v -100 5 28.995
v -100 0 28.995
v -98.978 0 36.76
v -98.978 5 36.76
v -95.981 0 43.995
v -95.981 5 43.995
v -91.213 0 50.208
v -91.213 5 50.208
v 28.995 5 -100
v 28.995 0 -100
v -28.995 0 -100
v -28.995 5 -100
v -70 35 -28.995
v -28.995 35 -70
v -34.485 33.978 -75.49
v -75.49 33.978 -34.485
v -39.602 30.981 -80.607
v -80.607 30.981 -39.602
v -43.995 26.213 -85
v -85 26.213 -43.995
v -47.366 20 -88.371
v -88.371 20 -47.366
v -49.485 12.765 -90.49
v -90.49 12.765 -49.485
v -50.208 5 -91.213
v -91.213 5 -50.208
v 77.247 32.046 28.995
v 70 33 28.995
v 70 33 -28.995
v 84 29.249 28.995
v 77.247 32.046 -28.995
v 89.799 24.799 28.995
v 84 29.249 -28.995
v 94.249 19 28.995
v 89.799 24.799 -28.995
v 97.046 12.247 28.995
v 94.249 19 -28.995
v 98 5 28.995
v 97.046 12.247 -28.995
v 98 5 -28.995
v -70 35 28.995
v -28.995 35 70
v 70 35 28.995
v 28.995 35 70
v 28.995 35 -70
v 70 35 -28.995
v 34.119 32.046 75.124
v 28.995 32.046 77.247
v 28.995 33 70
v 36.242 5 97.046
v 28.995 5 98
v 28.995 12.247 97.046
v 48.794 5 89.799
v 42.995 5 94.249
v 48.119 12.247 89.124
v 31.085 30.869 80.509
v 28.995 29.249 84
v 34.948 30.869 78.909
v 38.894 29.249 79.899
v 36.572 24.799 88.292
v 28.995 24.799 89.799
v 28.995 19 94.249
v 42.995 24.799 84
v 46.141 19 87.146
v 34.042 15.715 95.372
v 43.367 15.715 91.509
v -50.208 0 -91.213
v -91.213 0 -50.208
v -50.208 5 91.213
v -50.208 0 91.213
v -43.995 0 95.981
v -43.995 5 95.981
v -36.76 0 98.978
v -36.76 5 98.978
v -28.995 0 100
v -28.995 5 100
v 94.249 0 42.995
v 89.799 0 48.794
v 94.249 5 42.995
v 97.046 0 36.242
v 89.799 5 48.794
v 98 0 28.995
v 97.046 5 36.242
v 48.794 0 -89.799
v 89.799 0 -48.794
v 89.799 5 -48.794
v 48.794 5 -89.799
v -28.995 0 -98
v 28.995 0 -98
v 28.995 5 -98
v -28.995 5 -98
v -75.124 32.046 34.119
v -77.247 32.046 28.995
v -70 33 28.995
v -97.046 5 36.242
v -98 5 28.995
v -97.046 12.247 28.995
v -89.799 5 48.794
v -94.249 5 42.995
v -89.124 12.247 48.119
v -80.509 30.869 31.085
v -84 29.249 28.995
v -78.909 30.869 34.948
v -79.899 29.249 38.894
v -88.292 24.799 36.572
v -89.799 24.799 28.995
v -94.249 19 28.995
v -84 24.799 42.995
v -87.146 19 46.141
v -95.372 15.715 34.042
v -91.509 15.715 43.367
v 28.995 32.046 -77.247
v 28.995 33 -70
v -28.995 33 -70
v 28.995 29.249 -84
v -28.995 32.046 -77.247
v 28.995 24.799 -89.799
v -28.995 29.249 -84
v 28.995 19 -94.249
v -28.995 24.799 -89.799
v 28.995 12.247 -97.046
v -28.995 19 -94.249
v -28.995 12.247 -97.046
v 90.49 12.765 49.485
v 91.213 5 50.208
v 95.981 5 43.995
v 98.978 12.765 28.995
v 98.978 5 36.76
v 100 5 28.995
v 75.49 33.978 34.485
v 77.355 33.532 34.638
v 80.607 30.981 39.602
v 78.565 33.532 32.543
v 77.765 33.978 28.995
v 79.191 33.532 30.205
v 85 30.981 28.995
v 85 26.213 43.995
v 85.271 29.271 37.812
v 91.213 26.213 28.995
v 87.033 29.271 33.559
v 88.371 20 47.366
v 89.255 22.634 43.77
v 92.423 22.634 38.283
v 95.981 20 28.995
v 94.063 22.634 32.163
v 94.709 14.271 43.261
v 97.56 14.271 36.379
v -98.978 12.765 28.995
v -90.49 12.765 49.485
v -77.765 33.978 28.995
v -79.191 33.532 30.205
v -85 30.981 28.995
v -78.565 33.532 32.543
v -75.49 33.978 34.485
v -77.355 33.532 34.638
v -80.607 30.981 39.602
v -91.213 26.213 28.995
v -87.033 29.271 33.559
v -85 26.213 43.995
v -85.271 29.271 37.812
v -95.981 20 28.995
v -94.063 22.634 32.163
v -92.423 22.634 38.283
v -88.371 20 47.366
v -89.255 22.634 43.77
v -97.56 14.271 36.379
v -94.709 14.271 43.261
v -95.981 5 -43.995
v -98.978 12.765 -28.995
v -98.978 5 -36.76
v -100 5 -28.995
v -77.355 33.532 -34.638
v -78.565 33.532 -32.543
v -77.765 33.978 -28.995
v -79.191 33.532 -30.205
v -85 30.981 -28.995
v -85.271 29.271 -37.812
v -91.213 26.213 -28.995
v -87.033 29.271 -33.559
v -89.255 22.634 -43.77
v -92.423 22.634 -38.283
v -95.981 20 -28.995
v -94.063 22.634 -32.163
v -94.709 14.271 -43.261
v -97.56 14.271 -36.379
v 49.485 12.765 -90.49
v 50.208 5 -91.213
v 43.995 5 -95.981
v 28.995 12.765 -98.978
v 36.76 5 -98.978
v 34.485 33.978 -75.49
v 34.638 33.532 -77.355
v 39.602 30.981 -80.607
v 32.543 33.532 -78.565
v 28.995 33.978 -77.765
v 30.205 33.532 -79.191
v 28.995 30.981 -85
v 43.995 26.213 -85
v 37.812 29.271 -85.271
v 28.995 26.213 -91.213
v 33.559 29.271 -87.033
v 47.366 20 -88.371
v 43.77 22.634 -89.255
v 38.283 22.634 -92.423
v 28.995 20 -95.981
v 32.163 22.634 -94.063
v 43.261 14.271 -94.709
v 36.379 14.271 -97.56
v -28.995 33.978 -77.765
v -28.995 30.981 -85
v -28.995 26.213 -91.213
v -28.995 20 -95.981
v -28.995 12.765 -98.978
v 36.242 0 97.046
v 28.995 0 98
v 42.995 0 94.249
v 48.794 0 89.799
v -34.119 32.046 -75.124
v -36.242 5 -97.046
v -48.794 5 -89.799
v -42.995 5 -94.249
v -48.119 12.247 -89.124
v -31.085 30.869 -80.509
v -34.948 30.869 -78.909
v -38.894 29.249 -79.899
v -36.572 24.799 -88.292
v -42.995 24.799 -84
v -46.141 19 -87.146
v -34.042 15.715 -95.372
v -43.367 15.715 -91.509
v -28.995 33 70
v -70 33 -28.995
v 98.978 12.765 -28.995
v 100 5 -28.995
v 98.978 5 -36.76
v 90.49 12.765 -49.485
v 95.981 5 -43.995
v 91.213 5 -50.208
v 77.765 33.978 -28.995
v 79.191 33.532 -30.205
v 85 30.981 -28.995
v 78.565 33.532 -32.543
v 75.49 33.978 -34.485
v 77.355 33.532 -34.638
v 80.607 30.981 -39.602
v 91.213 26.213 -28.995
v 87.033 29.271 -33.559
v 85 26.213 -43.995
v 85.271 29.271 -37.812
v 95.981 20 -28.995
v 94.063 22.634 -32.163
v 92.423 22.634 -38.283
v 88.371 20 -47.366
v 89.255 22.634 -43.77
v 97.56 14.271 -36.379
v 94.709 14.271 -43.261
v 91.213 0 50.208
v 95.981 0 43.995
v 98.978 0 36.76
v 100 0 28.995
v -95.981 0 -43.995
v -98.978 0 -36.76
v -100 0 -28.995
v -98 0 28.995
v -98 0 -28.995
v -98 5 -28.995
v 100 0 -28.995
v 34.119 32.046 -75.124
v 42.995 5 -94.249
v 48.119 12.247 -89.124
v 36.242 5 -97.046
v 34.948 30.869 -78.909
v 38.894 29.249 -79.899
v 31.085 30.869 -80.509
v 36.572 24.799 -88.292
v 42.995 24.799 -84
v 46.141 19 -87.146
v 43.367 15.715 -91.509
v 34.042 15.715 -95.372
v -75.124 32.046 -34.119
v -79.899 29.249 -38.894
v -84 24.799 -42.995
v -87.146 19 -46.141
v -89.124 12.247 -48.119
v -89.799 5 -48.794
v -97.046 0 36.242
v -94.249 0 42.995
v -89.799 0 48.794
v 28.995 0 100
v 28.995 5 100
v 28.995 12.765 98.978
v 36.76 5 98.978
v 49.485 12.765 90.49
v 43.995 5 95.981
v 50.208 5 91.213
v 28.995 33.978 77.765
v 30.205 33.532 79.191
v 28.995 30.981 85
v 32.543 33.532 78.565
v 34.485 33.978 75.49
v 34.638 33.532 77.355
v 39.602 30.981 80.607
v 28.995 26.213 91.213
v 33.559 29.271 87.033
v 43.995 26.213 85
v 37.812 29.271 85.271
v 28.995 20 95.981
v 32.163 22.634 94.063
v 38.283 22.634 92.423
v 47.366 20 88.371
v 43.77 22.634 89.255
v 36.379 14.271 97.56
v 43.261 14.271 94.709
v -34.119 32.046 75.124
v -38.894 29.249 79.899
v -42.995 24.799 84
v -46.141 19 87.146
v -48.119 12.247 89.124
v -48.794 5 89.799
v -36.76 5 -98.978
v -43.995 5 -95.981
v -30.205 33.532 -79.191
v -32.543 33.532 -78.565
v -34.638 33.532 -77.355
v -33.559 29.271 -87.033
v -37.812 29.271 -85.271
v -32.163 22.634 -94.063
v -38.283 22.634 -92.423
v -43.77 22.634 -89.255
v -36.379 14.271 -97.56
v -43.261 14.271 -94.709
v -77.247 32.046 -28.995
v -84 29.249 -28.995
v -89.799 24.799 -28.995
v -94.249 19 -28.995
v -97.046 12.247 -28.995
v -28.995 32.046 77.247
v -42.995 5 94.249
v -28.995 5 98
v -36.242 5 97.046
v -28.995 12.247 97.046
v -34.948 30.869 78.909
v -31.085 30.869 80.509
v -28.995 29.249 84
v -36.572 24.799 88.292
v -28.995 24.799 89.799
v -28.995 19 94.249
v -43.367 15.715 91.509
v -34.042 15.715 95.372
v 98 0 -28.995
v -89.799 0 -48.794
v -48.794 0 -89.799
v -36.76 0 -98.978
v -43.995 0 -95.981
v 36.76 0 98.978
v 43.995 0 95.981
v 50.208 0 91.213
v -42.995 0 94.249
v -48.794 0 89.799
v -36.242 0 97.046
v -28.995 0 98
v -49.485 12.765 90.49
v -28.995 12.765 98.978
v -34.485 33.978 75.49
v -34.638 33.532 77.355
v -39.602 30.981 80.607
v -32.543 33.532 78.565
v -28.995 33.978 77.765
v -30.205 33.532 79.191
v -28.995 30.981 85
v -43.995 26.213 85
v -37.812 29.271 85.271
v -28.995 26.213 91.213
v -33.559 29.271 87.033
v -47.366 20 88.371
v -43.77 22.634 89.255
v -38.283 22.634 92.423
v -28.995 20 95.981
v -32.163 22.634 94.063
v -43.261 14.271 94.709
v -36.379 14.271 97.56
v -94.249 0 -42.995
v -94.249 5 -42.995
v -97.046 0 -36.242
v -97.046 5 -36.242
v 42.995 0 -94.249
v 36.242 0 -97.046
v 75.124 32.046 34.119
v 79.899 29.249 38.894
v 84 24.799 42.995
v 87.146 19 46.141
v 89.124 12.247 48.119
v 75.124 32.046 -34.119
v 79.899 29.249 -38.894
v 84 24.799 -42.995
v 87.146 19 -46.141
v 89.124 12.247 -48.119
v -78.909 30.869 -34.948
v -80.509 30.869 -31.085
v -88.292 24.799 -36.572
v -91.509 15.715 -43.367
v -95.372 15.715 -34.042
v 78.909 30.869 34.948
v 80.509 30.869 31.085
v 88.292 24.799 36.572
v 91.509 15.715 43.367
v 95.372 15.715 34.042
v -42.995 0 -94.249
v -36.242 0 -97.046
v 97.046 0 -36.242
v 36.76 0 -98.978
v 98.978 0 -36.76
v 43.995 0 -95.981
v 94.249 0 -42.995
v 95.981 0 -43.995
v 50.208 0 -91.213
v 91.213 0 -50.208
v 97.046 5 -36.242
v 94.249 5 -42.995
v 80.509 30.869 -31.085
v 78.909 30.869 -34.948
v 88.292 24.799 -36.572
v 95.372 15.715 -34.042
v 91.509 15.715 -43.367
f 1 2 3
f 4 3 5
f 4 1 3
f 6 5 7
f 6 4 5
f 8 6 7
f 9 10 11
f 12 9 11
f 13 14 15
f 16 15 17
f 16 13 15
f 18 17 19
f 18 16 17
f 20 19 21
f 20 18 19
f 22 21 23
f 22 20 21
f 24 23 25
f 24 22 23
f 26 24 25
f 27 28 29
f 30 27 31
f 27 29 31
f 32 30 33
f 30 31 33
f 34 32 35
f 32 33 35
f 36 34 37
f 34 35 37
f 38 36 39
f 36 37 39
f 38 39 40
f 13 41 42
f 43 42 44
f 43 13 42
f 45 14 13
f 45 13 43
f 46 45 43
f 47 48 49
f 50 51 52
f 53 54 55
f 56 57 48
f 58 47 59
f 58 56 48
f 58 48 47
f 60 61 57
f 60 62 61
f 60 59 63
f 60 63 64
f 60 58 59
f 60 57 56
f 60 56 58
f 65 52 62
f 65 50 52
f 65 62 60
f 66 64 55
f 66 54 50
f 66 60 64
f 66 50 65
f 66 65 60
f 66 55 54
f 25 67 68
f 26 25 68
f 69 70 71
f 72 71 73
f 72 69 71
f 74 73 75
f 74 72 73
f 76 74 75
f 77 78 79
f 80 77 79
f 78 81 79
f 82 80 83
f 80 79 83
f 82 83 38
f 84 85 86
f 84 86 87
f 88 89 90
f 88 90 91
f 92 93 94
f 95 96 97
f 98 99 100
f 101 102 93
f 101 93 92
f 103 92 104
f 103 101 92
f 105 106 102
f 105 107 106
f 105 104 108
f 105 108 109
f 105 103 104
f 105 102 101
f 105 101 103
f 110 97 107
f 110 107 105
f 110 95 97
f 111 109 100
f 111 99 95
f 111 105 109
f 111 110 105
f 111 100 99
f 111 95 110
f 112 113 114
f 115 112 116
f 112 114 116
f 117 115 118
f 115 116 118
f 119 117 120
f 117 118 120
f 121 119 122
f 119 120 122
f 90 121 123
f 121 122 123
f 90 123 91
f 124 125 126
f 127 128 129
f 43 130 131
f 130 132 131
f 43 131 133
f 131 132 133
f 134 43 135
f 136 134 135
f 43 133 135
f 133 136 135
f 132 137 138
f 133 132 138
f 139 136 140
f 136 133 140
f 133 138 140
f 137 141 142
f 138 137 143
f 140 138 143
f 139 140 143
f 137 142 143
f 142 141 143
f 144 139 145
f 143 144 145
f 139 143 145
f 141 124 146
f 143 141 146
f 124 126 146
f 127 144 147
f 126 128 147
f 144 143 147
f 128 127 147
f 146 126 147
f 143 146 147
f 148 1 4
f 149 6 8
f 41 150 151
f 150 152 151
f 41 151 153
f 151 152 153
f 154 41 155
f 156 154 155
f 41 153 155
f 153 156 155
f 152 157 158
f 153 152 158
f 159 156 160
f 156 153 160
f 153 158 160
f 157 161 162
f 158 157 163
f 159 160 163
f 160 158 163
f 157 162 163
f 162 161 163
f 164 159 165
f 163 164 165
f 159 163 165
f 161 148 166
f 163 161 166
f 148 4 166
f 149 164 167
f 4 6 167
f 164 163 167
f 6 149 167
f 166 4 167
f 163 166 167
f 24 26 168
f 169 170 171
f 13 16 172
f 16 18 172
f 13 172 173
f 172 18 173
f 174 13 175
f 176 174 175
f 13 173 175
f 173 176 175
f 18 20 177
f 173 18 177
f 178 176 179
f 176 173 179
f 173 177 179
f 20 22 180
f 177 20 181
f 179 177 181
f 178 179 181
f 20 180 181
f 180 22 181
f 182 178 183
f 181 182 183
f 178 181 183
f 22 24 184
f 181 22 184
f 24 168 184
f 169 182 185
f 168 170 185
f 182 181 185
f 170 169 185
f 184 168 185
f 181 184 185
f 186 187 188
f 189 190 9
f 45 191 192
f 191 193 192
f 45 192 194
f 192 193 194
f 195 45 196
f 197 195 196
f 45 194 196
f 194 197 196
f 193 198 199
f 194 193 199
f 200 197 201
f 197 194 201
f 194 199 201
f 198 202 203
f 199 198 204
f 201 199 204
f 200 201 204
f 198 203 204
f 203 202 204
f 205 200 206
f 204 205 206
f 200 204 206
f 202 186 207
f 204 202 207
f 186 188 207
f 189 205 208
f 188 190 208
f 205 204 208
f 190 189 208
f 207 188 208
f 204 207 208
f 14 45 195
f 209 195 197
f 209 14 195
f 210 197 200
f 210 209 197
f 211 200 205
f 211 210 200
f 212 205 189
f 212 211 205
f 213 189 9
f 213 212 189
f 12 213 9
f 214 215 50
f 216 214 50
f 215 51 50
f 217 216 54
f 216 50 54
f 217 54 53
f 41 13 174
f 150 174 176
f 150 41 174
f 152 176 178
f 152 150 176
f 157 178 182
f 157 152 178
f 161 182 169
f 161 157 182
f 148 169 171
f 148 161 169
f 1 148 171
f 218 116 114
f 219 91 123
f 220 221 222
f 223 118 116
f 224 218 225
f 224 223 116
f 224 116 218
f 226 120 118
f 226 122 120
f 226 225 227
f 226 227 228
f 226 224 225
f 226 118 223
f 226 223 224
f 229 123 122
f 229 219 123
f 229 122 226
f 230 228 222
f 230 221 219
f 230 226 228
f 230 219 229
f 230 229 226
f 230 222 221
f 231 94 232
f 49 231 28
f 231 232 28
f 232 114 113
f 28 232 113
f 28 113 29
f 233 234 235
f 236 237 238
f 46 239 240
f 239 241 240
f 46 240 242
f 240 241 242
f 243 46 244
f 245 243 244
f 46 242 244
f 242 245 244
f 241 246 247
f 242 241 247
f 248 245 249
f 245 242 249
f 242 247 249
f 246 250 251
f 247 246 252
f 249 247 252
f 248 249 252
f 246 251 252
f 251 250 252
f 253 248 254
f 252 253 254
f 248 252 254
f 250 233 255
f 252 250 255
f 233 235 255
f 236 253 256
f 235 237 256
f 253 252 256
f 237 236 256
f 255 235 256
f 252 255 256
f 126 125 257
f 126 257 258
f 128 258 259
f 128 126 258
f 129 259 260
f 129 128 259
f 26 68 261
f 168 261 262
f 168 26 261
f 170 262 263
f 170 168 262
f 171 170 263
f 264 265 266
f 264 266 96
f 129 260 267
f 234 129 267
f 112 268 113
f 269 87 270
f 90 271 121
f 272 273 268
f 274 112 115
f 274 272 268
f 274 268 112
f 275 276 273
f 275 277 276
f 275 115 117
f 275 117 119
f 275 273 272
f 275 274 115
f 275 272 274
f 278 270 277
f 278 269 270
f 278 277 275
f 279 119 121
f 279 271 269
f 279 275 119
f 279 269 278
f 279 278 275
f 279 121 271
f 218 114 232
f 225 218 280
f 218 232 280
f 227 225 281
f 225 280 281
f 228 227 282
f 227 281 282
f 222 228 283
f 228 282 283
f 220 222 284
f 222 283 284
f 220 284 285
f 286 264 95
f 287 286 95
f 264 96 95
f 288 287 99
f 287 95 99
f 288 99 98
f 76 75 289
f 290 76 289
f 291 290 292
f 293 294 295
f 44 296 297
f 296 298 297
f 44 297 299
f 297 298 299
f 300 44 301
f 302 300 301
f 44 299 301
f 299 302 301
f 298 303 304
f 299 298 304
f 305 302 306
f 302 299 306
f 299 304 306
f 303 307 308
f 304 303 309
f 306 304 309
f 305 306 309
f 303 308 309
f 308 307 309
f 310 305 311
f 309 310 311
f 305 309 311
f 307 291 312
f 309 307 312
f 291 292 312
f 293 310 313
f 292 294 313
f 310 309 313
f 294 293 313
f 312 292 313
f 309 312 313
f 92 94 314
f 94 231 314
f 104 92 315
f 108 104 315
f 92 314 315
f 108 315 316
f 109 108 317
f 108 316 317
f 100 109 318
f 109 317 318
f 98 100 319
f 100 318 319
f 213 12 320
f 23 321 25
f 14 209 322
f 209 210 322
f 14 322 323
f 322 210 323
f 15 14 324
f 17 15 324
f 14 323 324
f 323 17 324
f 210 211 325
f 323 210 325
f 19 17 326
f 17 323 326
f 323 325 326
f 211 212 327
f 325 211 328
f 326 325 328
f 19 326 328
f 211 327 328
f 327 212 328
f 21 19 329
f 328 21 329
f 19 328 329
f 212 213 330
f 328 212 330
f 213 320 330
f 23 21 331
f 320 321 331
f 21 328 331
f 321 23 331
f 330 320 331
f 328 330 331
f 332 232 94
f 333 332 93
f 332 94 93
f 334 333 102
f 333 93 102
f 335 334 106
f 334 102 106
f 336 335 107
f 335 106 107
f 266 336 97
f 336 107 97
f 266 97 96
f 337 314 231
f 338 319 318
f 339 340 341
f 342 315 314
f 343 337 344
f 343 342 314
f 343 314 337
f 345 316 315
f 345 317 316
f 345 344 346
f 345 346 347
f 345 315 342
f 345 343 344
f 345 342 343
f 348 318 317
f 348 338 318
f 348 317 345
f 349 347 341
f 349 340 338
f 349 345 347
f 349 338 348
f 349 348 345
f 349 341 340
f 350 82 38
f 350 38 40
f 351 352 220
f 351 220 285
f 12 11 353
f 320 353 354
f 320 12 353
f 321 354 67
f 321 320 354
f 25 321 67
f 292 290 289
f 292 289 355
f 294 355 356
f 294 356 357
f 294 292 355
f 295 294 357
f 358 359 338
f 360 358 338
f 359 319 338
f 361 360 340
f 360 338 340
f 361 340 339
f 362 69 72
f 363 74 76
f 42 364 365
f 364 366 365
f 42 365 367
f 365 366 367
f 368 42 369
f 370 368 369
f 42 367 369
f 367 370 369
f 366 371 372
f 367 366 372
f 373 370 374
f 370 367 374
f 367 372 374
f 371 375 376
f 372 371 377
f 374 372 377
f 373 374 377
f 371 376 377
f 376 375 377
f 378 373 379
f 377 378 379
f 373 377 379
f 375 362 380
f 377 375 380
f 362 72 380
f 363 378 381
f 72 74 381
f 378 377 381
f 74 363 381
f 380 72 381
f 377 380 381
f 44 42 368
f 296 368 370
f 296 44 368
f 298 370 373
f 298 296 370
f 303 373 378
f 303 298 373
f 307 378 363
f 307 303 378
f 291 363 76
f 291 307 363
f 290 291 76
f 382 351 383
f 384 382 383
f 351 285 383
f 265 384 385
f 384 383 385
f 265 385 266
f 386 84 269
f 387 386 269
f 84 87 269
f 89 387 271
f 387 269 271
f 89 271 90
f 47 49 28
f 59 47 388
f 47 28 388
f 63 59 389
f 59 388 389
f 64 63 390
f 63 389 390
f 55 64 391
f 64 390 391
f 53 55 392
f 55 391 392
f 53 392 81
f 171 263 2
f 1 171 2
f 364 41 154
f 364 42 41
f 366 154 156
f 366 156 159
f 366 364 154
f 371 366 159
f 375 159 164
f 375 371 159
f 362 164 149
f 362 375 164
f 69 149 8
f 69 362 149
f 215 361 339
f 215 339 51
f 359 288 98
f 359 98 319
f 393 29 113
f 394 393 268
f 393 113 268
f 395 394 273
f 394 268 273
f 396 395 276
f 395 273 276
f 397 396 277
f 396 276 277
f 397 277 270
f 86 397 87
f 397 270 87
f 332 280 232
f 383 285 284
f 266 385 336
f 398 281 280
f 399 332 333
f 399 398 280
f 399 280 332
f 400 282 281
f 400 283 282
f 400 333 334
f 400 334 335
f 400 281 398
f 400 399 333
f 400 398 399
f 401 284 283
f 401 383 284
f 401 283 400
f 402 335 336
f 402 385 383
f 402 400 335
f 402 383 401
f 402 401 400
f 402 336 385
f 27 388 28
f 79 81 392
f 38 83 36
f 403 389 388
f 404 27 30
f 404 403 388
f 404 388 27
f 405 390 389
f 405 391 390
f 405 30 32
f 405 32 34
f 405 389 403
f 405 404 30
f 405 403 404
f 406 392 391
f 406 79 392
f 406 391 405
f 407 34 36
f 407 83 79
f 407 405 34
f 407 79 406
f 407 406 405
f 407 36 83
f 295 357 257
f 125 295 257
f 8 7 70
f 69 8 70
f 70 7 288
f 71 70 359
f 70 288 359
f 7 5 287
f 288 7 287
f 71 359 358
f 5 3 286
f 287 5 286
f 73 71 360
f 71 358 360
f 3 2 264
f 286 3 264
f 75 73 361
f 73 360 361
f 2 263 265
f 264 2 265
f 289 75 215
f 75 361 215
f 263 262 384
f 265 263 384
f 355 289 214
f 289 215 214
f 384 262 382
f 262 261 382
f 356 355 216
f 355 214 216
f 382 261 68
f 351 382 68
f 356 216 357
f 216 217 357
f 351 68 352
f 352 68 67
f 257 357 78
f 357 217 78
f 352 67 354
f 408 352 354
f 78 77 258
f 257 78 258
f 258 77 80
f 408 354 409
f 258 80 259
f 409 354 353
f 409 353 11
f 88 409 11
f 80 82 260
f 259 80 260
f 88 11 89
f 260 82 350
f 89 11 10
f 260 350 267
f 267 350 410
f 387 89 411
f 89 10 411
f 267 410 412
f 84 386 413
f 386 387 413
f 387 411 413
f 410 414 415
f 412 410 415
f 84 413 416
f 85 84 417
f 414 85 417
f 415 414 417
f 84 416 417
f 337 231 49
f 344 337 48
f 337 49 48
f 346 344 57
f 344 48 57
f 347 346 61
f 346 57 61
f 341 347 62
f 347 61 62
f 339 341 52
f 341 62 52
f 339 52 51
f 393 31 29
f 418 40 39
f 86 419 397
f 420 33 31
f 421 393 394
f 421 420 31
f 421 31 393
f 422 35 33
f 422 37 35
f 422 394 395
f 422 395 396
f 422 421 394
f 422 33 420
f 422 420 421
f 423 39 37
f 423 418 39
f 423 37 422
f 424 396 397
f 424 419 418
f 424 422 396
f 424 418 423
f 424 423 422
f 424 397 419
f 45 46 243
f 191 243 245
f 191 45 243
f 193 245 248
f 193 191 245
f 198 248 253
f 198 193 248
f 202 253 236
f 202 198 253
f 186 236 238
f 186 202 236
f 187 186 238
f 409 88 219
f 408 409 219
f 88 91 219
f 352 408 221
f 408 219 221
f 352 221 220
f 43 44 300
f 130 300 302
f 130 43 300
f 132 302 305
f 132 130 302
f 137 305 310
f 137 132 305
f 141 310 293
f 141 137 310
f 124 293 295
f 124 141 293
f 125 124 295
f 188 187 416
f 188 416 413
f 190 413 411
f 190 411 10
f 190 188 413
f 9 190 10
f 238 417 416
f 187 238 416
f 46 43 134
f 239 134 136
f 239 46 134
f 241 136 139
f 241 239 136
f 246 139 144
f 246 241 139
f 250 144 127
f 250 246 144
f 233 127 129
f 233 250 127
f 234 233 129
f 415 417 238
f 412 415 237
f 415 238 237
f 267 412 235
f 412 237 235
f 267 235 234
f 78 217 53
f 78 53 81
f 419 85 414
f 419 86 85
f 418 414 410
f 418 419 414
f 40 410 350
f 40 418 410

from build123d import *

# Parameters (mm, degrees)
BOSS_EXTRUDE1_DEPTH = 35
FILLET9_R           = 30
FILLET12_R          = 30
SHELL2_T            = -2


with BuildPart() as part:
    # Sketch1 → Boss-Extrude1 (new body)
    with BuildSketch(Plane(origin=(0, 0, 0), x_dir=(1, 0, 0), z_dir=(0, 1, 0))):
        Polygon((100, 41.421356237), (41.421356237, 100), (-41.421356237, 100), (-100, 41.421356237), (-100, -41.421356237), (-41.421356237, -100), (41.421356237, -100), (100, -41.421356237), align=None)
    extrude(amount=BOSS_EXTRUDE1_DEPTH)

    # Fillet9
    fillet9_edges = [part.edges().sort_by_distance(p)[0] for p in [
        (41.421356237, 17.5, -100),
        (100, 17.5, -41.421356237),
        (100, 17.5, 41.421356237),
        (41.421356237, 17.5, 100),
        (-41.421356237, 17.5, 100),
        (-100, 17.5, 41.421356237),
        (-100, 17.5, -41.421356237),
        (-41.421356237, 17.5, -100),
    ]]
    fillet(fillet9_edges, radius=FILLET9_R)

    # Fillet12
    fillet12_edges = [part.edges().sort_by_distance(p)[0] for p in [
        (-70.710678119, 35, 70.710678119),
        (-100, 35, 0),
        (0, 35, -100),
        (-70.710678119, 35, -70.710678119),
        (0, 35, 100),
        (70.710678119, 35, 70.710678119),
        (100, 35, 0),
        (70.710678119, 35, -70.710678119),
        (-40.475452337, 35, 97.716385975),
        (40.475452337, 35, 97.716385975),
        (97.716385975, 35, 40.475452337),
        (97.716385975, 35, -40.475452337),
        (40.475452337, 35, -97.716385975),
        (-40.475452337, 35, -97.716385975),
        (-97.716385975, 35, -40.475452337),
        (-97.716385975, 35, 40.475452337),
    ]]
    fillet(fillet12_edges, radius=FILLET12_R)

    # Shell2
    shell2_openings = [part.faces().sort_by_distance(p)[0] for p in [
        (0, 0, 0),
    ]]
    offset(amount=SHELL2_T, openings=shell2_openings, kind=Kind.INTERSECTION)


solid = part.part
